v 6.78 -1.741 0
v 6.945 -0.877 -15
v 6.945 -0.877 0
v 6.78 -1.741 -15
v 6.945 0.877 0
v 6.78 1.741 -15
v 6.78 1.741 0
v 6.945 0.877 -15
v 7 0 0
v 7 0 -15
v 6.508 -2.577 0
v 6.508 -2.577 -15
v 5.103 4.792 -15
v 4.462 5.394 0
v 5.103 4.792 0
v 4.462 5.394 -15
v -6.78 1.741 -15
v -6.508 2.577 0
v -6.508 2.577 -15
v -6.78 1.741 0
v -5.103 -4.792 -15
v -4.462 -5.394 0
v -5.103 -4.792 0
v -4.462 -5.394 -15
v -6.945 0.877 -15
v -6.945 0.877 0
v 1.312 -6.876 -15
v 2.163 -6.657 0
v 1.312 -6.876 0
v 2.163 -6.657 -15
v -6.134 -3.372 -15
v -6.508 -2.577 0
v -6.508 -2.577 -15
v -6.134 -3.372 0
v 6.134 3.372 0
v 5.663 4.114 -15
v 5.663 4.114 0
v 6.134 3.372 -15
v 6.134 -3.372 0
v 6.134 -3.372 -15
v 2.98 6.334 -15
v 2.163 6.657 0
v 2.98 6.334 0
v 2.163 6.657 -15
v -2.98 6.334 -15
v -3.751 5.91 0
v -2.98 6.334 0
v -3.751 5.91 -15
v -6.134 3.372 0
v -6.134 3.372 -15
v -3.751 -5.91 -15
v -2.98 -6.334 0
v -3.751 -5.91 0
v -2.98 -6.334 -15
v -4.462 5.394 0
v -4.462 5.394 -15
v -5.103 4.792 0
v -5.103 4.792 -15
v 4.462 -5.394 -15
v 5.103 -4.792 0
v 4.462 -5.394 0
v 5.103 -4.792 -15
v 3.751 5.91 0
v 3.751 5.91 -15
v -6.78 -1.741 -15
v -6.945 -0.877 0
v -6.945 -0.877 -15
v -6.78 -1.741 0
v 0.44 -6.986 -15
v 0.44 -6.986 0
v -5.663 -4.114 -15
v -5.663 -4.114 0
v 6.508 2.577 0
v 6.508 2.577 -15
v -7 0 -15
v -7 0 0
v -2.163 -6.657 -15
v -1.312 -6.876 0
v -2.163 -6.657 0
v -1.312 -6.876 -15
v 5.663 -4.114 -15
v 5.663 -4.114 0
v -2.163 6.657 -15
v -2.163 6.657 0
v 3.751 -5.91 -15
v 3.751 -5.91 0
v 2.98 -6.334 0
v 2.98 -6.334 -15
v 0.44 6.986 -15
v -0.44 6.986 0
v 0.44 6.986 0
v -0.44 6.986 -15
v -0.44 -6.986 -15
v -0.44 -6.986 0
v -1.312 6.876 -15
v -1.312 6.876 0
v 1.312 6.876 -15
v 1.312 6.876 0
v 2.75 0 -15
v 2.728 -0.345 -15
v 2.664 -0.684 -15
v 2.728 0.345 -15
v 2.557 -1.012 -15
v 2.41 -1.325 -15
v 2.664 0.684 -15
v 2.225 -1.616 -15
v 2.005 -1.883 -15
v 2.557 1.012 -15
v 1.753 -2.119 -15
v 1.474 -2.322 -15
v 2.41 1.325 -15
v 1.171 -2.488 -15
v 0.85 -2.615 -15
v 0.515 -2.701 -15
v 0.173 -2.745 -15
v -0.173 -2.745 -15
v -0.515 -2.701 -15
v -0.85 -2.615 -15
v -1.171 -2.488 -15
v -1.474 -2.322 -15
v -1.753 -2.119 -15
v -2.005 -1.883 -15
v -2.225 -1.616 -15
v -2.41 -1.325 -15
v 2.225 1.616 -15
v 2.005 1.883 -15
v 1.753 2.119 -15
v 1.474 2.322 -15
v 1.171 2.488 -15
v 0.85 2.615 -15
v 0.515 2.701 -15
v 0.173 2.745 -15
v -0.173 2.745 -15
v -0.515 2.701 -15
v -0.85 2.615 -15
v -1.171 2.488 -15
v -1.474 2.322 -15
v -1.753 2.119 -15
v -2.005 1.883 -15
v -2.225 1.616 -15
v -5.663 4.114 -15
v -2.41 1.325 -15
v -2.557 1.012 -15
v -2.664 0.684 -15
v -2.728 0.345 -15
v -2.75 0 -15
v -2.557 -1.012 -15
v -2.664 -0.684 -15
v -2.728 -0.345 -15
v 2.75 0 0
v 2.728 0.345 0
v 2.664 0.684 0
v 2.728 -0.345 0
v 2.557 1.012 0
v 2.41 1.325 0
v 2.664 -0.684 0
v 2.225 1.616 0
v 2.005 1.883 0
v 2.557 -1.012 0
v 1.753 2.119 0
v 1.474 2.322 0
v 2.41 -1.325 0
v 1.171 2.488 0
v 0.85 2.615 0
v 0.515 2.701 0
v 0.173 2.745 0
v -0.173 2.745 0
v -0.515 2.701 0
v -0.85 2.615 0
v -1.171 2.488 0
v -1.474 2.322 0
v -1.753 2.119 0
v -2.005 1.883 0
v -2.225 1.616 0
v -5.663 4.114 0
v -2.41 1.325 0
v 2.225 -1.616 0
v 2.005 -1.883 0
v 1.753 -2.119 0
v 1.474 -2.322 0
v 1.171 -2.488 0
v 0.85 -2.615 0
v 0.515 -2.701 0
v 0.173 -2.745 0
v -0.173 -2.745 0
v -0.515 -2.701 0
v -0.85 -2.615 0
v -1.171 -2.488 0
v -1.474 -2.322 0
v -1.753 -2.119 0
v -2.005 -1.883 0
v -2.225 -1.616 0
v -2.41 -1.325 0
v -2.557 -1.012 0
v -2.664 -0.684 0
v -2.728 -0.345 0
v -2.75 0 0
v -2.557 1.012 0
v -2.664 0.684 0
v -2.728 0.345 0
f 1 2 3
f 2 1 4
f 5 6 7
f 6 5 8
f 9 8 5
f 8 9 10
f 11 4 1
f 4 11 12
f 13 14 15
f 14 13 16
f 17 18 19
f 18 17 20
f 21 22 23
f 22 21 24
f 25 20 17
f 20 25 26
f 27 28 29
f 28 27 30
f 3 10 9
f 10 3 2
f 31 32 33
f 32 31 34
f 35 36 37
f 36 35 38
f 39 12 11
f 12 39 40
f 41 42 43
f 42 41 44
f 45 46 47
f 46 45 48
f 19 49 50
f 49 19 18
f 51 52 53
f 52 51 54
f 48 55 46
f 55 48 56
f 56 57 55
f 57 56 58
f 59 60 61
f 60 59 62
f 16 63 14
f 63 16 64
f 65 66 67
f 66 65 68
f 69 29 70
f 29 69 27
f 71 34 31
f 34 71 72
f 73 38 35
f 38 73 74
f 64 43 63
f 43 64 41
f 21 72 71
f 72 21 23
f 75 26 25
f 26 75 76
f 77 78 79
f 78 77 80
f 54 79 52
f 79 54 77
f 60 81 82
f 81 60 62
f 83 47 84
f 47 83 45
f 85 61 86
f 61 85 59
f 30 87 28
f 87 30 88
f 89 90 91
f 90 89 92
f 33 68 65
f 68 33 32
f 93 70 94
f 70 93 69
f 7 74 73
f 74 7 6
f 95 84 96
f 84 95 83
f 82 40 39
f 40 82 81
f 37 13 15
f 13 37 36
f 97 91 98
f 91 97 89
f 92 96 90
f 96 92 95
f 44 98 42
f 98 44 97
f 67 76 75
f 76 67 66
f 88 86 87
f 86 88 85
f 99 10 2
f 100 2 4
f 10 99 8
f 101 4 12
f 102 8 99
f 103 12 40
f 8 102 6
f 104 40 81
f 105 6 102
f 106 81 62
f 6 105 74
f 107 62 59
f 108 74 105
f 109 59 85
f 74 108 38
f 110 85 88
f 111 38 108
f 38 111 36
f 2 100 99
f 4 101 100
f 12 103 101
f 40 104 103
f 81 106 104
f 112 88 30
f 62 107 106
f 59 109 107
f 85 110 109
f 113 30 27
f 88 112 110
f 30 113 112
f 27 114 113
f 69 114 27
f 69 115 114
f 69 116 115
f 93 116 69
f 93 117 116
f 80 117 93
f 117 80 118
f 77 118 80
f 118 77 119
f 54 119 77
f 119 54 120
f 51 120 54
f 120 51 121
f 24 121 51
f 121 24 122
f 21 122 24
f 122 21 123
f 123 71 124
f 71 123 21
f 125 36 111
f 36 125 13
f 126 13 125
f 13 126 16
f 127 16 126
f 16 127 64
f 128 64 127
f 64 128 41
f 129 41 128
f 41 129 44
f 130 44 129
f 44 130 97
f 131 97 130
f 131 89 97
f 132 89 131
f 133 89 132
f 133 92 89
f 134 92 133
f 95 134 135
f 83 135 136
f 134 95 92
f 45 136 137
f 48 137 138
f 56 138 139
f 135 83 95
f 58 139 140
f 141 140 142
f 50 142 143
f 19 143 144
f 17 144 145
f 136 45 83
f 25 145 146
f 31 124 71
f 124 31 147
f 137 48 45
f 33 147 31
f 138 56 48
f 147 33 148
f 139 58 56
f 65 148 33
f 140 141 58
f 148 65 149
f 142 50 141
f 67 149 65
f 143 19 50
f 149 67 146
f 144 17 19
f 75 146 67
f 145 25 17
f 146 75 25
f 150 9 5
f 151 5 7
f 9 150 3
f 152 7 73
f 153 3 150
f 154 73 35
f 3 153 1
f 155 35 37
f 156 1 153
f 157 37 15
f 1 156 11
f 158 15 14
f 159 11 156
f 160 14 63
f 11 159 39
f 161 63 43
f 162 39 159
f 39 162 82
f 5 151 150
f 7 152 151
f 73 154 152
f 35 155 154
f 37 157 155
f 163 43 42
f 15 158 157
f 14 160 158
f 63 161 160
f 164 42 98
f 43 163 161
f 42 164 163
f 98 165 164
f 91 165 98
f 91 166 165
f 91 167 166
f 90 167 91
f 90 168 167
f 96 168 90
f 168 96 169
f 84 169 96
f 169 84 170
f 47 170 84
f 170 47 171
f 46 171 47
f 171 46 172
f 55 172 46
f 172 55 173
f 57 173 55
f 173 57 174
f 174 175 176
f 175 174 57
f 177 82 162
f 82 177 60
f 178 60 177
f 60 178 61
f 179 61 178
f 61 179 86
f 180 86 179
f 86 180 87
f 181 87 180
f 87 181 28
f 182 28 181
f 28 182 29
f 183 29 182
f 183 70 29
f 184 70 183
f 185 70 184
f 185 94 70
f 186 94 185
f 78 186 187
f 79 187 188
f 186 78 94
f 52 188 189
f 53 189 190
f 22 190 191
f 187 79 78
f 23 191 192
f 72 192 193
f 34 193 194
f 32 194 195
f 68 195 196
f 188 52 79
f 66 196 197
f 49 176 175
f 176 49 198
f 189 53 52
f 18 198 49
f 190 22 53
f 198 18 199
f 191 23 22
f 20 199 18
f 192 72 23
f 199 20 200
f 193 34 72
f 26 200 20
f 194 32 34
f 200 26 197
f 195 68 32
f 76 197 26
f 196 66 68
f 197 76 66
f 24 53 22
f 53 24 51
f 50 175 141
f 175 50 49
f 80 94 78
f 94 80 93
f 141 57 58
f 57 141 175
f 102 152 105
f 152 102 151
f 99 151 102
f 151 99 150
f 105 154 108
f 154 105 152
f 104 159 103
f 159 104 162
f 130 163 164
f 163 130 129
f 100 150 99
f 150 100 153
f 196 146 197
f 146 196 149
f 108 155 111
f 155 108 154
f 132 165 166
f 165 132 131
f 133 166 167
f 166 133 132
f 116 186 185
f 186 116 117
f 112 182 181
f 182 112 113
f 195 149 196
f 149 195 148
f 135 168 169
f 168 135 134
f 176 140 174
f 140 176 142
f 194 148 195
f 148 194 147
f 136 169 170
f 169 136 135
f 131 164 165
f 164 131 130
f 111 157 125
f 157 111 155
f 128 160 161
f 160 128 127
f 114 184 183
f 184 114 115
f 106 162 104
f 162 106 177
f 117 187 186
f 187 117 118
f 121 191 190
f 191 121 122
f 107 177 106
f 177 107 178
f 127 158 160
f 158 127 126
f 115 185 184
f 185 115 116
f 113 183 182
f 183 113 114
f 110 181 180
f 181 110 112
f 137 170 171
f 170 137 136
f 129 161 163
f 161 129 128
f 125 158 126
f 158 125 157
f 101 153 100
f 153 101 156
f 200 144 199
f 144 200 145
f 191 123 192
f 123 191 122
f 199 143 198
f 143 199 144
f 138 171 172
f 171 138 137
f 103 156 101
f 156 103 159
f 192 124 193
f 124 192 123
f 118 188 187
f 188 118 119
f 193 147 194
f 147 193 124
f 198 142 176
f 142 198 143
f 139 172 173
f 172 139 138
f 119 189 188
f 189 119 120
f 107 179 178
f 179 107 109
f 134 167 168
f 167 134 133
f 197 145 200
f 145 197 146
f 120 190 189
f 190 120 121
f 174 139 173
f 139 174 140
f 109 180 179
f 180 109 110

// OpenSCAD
$fn = 50;


difference() {
	union() {
		translate(v = [0, 0, -15.0000000000]) {
			cylinder(h = 15, r = 7.0000000000);
		}
		cylinder(h = 0, r = 13.0000000000);
	}
	union() {
		#translate(v = [0, 0, -15]) {
			cylinder(h = 15, r = 2.7500000000);
		}
	}
}
